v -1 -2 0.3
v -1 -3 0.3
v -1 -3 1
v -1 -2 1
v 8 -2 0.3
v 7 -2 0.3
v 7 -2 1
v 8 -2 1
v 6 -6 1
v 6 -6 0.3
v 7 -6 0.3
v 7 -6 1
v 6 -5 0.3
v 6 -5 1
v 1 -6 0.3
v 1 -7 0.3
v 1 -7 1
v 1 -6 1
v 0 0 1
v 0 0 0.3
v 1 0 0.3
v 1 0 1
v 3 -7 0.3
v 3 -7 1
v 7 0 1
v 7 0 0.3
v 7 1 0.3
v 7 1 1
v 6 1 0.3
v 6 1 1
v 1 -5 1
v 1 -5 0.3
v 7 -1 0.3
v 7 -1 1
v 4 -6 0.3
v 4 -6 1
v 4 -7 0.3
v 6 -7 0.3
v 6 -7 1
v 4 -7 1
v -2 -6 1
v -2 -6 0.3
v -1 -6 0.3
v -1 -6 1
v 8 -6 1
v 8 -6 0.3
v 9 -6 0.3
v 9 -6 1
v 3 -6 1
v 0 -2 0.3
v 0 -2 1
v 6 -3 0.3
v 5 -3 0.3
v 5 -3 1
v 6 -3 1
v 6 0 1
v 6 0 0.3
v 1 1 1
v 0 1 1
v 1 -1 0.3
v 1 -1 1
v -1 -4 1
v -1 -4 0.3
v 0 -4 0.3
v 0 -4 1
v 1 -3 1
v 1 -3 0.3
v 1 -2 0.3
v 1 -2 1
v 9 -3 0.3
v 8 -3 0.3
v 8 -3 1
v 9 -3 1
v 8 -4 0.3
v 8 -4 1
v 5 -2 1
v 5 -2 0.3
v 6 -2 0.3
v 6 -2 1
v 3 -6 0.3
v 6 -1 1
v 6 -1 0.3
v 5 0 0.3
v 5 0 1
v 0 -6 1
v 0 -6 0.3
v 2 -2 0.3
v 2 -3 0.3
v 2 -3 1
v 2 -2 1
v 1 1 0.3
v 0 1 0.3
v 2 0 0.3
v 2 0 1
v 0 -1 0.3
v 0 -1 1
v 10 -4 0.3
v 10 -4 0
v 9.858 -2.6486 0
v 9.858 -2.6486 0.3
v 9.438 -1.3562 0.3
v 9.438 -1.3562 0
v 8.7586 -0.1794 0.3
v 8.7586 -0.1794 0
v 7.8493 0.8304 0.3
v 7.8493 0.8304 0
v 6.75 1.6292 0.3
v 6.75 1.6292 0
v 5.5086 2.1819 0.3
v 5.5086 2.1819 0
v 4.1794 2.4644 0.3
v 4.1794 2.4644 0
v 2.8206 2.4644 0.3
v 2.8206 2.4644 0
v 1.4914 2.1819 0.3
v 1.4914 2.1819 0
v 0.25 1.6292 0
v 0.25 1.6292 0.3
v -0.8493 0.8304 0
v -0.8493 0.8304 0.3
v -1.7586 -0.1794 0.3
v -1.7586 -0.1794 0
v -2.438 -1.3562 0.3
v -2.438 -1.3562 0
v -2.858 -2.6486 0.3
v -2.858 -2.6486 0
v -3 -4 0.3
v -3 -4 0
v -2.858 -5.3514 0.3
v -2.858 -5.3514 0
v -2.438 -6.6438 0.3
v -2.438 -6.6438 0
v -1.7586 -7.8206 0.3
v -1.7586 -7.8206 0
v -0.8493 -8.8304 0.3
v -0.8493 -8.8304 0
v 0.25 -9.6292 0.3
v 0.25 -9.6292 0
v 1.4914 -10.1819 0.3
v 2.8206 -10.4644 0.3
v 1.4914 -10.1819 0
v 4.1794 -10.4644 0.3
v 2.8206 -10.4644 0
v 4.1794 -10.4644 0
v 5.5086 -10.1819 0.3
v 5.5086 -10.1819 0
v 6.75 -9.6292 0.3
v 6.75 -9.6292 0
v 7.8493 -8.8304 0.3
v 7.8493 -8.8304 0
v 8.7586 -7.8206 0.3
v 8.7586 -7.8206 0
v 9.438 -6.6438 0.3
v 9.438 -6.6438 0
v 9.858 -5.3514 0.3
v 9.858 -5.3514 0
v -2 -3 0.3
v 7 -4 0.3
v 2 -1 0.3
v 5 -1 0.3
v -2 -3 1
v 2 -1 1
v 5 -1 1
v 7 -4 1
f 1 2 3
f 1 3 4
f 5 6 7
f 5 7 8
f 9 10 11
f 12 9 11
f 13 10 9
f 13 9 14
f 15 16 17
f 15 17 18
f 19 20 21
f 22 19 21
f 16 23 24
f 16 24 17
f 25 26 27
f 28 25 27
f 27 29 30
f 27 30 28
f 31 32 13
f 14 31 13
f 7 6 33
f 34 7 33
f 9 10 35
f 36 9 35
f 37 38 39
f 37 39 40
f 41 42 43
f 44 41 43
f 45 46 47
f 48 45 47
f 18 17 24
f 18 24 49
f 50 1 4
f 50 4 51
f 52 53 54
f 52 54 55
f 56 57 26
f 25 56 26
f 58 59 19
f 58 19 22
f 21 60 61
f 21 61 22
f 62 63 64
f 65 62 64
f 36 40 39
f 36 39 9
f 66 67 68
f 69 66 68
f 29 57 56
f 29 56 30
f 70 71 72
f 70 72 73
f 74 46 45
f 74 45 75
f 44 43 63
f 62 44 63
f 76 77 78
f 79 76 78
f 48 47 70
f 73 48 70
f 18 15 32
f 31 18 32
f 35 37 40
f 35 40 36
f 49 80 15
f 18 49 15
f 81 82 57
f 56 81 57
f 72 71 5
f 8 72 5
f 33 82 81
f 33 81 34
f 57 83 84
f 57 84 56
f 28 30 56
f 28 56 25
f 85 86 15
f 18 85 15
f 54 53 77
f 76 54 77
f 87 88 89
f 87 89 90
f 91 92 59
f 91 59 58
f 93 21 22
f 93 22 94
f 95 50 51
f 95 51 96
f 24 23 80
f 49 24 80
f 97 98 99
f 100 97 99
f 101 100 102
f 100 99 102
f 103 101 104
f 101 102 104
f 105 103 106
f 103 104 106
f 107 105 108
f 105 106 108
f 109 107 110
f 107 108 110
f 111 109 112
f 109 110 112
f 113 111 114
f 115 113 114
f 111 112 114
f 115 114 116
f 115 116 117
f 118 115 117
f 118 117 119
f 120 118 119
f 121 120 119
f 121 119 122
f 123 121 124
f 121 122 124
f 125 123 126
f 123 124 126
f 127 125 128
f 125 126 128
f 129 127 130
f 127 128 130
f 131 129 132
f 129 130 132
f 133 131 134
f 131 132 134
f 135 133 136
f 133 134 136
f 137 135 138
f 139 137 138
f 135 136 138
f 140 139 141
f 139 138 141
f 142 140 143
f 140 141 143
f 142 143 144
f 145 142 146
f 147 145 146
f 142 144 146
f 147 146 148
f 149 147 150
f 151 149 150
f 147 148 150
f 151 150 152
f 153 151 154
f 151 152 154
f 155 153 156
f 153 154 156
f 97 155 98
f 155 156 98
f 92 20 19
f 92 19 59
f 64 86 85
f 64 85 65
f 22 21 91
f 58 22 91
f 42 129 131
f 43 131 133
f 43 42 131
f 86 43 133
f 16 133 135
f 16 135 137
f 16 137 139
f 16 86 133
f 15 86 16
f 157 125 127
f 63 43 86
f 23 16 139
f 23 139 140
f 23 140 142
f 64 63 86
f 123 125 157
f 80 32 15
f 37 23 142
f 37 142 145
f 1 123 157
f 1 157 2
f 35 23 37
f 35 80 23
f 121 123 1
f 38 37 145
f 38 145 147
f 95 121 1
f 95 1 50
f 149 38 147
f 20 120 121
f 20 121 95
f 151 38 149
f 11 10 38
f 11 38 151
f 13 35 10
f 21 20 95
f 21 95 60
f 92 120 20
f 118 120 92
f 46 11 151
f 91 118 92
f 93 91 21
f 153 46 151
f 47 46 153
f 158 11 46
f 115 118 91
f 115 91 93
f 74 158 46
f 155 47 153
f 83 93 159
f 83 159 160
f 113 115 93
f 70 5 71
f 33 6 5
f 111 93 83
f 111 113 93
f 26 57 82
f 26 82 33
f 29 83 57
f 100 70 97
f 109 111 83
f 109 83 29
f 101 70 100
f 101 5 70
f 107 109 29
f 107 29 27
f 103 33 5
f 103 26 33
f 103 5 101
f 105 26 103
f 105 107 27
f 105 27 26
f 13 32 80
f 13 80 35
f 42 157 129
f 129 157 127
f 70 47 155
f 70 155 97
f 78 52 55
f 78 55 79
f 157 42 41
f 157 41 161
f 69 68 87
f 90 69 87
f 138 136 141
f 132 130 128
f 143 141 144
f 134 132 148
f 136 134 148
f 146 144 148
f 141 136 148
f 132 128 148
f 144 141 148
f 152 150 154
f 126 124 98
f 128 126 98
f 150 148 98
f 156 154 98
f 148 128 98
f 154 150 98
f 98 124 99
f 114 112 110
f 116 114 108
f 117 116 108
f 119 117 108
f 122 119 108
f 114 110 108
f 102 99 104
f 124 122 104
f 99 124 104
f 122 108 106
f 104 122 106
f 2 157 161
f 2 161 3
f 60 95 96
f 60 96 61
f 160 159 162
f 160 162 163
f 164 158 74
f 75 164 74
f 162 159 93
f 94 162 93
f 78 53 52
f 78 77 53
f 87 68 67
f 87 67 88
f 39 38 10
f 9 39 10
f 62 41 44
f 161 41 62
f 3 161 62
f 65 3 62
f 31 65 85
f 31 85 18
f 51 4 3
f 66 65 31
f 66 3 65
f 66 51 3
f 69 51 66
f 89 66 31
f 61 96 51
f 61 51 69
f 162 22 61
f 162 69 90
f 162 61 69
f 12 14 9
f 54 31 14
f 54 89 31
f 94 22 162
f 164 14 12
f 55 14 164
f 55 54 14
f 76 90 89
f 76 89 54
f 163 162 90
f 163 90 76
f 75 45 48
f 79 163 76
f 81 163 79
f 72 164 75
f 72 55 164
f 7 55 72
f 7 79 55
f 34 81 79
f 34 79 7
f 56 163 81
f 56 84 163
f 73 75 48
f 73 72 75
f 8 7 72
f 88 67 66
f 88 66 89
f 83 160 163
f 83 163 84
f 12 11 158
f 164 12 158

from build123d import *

# Parameters (mm, degrees)
CYLINDER_R     = 6.5
CYLINDER_DEPTH = 0.3
BOX001_W       = 1
BOX001_H       = 2
BOX001_DEPTH   = 1
BOX002_W       = 3
BOX002_H       = 4
BOX002_DEPTH   = 1
BOX003_W       = 1
BOX003_H       = 2
BOX003_DEPTH   = 1
BOX004_W       = 1
BOX004_H       = 1
BOX004_DEPTH   = 1
BOX005_W       = 1
BOX005_H       = 5
BOX005_DEPTH   = 1
BOX006_W       = 1
BOX006_H       = 5
BOX006_DEPTH   = 1
BOX007_W       = 1
BOX007_H       = 2
BOX007_DEPTH   = 1
BOX008_W       = 1
BOX008_H       = 2
BOX008_DEPTH   = 1
BOX009_W       = 1
BOX009_H       = 2
BOX009_DEPTH   = 1
BOX010_W       = 1
BOX010_H       = 2
BOX010_DEPTH   = 1
BOX011_W       = 1
BOX011_H       = 3
BOX011_DEPTH   = 1
BOX012_W       = 1
BOX012_H       = 3
BOX012_DEPTH   = 1
BOX013_W       = 1
BOX013_H       = 2
BOX013_DEPTH   = 1
BOX014_W       = 1
BOX014_H       = 2
BOX014_DEPTH   = 1
BOX_W          = 1
BOX_H          = 1
BOX_DEPTH      = 1


with BuildPart() as cilindro:
    # Cylinder → Cylinder (new body)
    with BuildSketch(Plane(origin=(3.5, -4, 0), x_dir=(1, 0, 0), z_dir=(0, 0, 1))):
        Circle(CYLINDER_R)
    extrude(amount=CYLINDER_DEPTH)


with BuildPart() as cubo001:
    # Box001 → Box001 (new body)
    with BuildSketch(Plane(origin=(1, -2, 0), x_dir=(1, 0, 0), z_dir=(0, 0, 1))):
        with Locations((0.5, 1)):
            Rectangle(BOX001_W, BOX001_H)
    extrude(amount=BOX001_DEPTH)


with BuildPart() as cubo002:
    # Box002 → Box002 (new body)
    with BuildSketch(Plane(origin=(2, -5, 0), x_dir=(1, 0, 0), z_dir=(0, 0, 1))):
        with Locations((1.5, 2)):
            Rectangle(BOX002_W, BOX002_H)
    extrude(amount=BOX002_DEPTH)


with BuildPart() as cubo003:
    # Box003 → Box003 (new body)
    with BuildSketch(Plane(origin=(5, -2, 0), x_dir=(1, 0, 0), z_dir=(0, 0, 1))):
        with Locations((0.5, 1)):
            Rectangle(BOX003_W, BOX003_H)
    extrude(amount=BOX003_DEPTH)


with BuildPart() as cubo004:
    # Box004 → Box004 (new body)
    with BuildSketch(Plane(origin=(6, 0, 0), x_dir=(1, 0, 0), z_dir=(0, 0, 1))):
        with Locations((0.5, 0.5)):
            Rectangle(BOX004_W, BOX004_H)
    extrude(amount=BOX004_DEPTH)


with BuildPart() as cubo005:
    # Box005 → Box005 (new body)
    with BuildSketch(Plane(origin=(0, -6, 0), x_dir=(1, 0, 0), z_dir=(0, 0, 1))):
        with Locations((0.5, 2.5)):
            Rectangle(BOX005_W, BOX005_H)
    extrude(amount=BOX005_DEPTH)


with BuildPart() as cubo006:
    # Box006 → Box006 (new body)
    with BuildSketch(Plane(origin=(6, -6, 0), x_dir=(1, 0, 0), z_dir=(0, 0, 1))):
        with Locations((0.5, 2.5)):
            Rectangle(BOX006_W, BOX006_H)
    extrude(amount=BOX006_DEPTH)


with BuildPart() as cubo007:
    # Box007 → Box007 (new body)
    with BuildSketch(Plane(origin=(1, -5, 0), x_dir=(1, 0, 0), z_dir=(0, 0, 1))):
        with Locations((0.5, 1)):
            Rectangle(BOX007_W, BOX007_H)
    extrude(amount=BOX007_DEPTH)


with BuildPart() as cubo008:
    # Box008 → Box008 (new body)
    with BuildSketch(Plane(origin=(5, -5, 0), x_dir=(1, 0, 0), z_dir=(0, 0, 1))):
        with Locations((0.5, 1)):
            Rectangle(BOX008_W, BOX008_H)
    extrude(amount=BOX008_DEPTH)


with BuildPart() as cubo009:
    # Box009 → Box009 (new body)
    with BuildSketch(Plane(origin=(-1, -4, 0), x_dir=(1, 0, 0), z_dir=(0, 0, 1))):
        with Locations((0.5, 1)):
            Rectangle(BOX009_W, BOX009_H)
    extrude(amount=BOX009_DEPTH)


with BuildPart() as cubo010:
    # Box010 → Box010 (new body)
    with BuildSketch(Plane(origin=(7, -4, 0), x_dir=(1, 0, 0), z_dir=(0, 0, 1))):
        with Locations((0.5, 1)):
            Rectangle(BOX010_W, BOX010_H)
    extrude(amount=BOX010_DEPTH)


with BuildPart() as cubo011:
    # Box011 → Box011 (new body)
    with BuildSketch(Plane(origin=(-2, -6, 0), x_dir=(1, 0, 0), z_dir=(0, 0, 1))):
        with Locations((0.5, 1.5)):
            Rectangle(BOX011_W, BOX011_H)
    extrude(amount=BOX011_DEPTH)


with BuildPart() as cubo012:
    # Box012 → Box012 (new body)
    with BuildSketch(Plane(origin=(8, -6, 0), x_dir=(1, 0, 0), z_dir=(0, 0, 1))):
        with Locations((0.5, 1.5)):
            Rectangle(BOX012_W, BOX012_H)
    extrude(amount=BOX012_DEPTH)


with BuildPart() as cubo013:
    # Box013 → Box013 (new body)
    with BuildSketch(Plane(origin=(3, -7, 0), x_dir=(0, 1, 0), z_dir=(0, 0, 1))):
        with Locations((0.5, 1)):
            Rectangle(BOX013_W, BOX013_H)
    extrude(amount=BOX013_DEPTH)


with BuildPart() as cubo014:
    # Box014 → Box014 (new body)
    with BuildSketch(Plane(origin=(6, -7, 0), x_dir=(0, 1, 0), z_dir=(0, 0, 1))):
        with Locations((0.5, 1)):
            Rectangle(BOX014_W, BOX014_H)
    extrude(amount=BOX014_DEPTH)


with BuildPart() as fusion001:
    # Box → Box (new body)
    with BuildSketch(Plane.XY):
        with Locations((0.5, 0.5)):
            Rectangle(BOX_W, BOX_H)
    extrude(amount=BOX_DEPTH)

    # Fusion: union Cubo001, Cubo002, Cubo003, Cubo004, Cubo005, Cubo006, Cubo007, Cubo008, Cubo009, Cubo010, Cubo011, Cubo012, Cubo013, Cubo014
    add(cubo001.part)
    add(cubo002.part)
    add(cubo003.part)
    add(cubo004.part)
    add(cubo005.part)
    add(cubo006.part)
    add(cubo007.part)
    add(cubo008.part)
    add(cubo009.part)
    add(cubo010.part)
    add(cubo011.part)
    add(cubo012.part)
    add(cubo013.part)
    add(cubo014.part)

    # Fusion001: union Cilindro
    add(cilindro.part)


solid = fusion001.part
